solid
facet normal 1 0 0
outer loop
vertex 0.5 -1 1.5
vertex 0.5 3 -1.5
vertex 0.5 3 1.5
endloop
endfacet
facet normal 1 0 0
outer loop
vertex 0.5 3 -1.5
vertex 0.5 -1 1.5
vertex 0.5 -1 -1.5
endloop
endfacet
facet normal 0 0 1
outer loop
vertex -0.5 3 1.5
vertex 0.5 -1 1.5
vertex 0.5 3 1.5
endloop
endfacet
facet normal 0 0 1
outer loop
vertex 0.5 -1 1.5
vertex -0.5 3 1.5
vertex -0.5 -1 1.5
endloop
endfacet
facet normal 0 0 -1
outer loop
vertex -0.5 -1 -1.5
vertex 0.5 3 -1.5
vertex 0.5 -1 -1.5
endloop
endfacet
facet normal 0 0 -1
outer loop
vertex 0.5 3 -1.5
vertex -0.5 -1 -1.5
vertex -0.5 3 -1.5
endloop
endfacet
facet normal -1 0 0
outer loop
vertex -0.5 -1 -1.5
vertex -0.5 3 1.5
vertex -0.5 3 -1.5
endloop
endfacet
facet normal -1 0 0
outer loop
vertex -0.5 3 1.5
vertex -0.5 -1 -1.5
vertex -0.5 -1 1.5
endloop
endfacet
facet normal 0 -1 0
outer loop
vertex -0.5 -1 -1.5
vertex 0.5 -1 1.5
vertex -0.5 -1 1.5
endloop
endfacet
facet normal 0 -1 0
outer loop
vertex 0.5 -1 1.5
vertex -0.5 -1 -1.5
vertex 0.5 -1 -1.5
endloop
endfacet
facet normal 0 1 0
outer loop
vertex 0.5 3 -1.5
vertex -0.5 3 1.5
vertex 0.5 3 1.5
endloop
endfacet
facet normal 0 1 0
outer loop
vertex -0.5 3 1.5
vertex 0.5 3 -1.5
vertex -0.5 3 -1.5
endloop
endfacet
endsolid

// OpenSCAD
// Object: randomCuboid
translate([0, 0, 0]) rotate([0, 0, 0]) cube([1, 2, 3], center=true);

// Object: cuboidAbove
translate([0, 2, 0]) rotate([0, 0, 0]) cube([1, 2, 3], center=true);
